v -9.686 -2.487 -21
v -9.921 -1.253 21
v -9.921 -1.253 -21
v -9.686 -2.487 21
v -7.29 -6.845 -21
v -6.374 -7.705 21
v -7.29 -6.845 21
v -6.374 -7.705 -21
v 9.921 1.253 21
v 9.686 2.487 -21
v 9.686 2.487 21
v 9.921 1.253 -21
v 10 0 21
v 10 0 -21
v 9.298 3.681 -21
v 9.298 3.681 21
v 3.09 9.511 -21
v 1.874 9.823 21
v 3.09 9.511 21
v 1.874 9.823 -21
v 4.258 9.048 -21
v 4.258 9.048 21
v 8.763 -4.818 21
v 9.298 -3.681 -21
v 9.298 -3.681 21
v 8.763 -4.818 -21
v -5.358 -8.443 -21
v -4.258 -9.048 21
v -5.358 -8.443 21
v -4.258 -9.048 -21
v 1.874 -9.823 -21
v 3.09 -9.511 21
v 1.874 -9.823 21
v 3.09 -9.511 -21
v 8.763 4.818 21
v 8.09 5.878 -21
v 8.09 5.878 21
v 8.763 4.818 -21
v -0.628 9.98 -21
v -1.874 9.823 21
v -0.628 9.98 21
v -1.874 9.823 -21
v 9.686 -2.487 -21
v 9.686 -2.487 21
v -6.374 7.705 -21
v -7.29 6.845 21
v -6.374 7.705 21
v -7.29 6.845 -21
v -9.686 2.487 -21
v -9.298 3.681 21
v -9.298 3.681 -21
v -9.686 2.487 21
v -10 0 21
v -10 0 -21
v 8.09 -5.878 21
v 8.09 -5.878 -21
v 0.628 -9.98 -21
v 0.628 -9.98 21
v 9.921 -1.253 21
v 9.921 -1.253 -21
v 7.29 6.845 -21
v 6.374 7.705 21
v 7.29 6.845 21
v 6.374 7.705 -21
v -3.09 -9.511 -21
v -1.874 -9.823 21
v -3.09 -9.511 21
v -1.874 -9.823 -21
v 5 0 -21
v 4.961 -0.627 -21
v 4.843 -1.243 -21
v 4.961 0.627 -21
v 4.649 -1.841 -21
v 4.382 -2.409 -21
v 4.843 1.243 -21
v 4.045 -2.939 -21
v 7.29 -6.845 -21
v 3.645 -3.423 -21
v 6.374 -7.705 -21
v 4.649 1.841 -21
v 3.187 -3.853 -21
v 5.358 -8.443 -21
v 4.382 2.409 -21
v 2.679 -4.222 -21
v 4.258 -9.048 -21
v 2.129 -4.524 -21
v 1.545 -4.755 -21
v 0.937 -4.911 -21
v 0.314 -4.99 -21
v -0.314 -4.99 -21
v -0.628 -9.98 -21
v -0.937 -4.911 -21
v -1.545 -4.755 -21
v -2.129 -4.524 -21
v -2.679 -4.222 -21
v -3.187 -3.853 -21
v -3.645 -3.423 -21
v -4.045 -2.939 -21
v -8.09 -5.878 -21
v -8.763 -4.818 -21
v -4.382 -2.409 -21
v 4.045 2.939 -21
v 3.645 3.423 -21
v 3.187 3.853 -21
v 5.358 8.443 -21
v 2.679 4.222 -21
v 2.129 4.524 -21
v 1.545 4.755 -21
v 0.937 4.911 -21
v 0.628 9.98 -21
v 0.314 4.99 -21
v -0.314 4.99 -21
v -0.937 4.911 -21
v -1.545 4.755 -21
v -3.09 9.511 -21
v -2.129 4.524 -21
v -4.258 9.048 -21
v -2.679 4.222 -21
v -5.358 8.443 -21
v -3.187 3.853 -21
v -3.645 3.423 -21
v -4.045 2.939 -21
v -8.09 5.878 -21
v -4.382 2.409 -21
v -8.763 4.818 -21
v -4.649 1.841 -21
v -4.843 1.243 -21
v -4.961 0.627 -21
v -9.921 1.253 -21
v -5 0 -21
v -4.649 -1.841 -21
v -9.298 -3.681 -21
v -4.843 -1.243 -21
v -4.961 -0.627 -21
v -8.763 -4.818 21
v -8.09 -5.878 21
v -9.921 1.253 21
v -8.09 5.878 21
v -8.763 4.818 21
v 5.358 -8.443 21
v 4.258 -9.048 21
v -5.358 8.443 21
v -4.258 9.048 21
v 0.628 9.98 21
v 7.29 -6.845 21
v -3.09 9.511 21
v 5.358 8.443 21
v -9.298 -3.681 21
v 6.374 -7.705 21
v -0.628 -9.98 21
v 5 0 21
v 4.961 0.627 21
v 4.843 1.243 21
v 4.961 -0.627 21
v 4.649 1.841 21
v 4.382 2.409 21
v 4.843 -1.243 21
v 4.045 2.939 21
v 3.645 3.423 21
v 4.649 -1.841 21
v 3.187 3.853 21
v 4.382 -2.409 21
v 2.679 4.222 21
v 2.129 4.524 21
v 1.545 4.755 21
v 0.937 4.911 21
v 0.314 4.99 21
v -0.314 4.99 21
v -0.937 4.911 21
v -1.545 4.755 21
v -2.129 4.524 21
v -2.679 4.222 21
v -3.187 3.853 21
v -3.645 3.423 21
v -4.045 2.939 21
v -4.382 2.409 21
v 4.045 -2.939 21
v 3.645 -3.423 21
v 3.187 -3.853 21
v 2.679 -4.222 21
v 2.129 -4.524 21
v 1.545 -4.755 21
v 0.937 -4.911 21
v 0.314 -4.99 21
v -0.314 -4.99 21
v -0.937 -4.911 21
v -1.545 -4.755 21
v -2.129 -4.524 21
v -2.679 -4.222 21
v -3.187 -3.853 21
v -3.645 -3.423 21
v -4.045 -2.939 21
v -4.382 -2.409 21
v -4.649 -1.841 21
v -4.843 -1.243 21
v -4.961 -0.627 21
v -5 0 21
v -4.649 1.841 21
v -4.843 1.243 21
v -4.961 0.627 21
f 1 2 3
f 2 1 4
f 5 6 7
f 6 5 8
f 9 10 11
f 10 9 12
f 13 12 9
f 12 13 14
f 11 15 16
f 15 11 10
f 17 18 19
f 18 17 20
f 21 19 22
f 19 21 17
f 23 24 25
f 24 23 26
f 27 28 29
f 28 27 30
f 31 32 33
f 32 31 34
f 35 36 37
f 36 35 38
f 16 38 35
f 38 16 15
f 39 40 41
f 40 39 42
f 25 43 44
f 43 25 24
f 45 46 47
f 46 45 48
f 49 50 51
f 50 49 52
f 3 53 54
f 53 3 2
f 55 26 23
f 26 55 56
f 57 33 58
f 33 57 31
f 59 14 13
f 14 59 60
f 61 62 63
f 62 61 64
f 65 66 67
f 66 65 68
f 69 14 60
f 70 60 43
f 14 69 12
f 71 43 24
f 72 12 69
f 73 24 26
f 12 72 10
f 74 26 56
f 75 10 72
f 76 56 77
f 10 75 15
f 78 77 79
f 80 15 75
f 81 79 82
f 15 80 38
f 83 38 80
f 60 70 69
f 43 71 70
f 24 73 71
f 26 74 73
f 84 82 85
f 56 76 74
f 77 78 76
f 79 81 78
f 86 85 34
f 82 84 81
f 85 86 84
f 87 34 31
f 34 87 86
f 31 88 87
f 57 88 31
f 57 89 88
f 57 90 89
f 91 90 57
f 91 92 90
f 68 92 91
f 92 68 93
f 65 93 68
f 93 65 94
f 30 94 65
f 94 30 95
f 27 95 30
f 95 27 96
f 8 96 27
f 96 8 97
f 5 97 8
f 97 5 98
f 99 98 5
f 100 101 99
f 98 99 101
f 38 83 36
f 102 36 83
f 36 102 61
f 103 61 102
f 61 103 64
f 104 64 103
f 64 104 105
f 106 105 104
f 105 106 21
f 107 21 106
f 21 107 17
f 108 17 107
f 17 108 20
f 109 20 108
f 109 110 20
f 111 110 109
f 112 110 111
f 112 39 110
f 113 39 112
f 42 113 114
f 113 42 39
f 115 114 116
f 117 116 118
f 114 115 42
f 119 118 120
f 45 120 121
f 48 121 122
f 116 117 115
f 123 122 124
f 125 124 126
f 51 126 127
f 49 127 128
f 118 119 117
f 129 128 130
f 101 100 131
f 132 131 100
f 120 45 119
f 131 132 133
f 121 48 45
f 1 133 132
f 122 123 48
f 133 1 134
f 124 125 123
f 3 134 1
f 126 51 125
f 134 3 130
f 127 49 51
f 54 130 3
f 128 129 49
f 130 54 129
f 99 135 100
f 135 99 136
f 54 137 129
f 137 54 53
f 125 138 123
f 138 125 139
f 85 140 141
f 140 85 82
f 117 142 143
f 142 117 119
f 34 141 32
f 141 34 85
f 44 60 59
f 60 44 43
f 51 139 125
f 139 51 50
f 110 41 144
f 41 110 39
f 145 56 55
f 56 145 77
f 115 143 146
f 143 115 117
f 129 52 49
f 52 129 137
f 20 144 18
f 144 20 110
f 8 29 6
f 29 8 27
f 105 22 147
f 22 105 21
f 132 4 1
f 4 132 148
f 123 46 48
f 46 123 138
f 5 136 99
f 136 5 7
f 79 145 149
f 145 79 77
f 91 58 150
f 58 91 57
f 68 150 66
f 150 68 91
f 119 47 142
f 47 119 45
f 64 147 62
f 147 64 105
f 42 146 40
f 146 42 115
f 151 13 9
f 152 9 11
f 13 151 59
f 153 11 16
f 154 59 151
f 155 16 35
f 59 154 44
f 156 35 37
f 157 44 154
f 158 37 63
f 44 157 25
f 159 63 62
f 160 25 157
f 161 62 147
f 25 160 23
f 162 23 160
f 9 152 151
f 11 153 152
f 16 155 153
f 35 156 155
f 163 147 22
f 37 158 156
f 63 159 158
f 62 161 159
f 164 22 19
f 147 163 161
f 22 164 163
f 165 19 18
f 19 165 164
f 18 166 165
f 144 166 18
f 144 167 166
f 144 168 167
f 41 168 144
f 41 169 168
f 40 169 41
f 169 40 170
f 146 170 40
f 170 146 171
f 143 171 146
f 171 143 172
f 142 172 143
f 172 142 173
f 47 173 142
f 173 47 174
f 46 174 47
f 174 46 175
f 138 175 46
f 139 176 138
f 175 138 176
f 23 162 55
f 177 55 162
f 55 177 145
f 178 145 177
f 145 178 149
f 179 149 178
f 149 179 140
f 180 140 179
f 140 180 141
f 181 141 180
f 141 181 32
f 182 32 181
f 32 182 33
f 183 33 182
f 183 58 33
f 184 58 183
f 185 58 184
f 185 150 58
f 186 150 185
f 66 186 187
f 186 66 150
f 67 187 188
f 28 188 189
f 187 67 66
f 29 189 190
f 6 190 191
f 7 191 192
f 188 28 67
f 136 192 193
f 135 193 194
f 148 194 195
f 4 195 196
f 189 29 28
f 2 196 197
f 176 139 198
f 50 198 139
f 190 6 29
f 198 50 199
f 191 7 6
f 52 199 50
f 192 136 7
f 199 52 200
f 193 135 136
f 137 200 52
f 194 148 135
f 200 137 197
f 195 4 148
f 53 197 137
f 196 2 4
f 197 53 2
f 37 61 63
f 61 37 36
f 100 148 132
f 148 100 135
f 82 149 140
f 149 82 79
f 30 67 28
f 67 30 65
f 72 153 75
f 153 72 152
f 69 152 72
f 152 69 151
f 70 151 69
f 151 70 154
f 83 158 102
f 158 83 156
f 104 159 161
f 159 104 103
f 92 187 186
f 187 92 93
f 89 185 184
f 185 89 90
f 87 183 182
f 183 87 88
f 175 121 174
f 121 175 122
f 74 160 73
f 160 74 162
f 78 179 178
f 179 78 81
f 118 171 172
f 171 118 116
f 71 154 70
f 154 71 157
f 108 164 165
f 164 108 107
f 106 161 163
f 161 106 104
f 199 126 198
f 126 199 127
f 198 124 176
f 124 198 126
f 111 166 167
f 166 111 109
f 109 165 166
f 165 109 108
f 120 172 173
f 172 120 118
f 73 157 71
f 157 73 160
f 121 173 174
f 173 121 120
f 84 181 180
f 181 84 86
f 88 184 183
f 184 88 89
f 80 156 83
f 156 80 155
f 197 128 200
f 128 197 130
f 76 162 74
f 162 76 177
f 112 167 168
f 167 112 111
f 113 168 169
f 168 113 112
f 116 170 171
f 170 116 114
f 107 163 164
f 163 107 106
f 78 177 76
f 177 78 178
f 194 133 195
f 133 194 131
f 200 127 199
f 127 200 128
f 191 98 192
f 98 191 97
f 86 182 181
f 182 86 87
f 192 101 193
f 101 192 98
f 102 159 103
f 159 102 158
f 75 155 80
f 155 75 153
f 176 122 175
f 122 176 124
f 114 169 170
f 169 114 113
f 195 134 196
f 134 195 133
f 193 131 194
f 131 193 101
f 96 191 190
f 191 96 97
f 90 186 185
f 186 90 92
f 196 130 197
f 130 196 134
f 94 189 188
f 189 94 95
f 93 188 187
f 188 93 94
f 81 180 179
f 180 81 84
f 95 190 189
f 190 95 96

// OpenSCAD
$fn = 50;


difference() {
	union() {
		translate(v = [0, 0, -21.0000000000]) {
			cylinder(h = 42, r = 10.0000000000);
		}
	}
	union() {
		translate(v = [0, 0, -100.0000000000]) {
			cylinder(h = 200, r = 5.0000000000);
		}
	}
}
